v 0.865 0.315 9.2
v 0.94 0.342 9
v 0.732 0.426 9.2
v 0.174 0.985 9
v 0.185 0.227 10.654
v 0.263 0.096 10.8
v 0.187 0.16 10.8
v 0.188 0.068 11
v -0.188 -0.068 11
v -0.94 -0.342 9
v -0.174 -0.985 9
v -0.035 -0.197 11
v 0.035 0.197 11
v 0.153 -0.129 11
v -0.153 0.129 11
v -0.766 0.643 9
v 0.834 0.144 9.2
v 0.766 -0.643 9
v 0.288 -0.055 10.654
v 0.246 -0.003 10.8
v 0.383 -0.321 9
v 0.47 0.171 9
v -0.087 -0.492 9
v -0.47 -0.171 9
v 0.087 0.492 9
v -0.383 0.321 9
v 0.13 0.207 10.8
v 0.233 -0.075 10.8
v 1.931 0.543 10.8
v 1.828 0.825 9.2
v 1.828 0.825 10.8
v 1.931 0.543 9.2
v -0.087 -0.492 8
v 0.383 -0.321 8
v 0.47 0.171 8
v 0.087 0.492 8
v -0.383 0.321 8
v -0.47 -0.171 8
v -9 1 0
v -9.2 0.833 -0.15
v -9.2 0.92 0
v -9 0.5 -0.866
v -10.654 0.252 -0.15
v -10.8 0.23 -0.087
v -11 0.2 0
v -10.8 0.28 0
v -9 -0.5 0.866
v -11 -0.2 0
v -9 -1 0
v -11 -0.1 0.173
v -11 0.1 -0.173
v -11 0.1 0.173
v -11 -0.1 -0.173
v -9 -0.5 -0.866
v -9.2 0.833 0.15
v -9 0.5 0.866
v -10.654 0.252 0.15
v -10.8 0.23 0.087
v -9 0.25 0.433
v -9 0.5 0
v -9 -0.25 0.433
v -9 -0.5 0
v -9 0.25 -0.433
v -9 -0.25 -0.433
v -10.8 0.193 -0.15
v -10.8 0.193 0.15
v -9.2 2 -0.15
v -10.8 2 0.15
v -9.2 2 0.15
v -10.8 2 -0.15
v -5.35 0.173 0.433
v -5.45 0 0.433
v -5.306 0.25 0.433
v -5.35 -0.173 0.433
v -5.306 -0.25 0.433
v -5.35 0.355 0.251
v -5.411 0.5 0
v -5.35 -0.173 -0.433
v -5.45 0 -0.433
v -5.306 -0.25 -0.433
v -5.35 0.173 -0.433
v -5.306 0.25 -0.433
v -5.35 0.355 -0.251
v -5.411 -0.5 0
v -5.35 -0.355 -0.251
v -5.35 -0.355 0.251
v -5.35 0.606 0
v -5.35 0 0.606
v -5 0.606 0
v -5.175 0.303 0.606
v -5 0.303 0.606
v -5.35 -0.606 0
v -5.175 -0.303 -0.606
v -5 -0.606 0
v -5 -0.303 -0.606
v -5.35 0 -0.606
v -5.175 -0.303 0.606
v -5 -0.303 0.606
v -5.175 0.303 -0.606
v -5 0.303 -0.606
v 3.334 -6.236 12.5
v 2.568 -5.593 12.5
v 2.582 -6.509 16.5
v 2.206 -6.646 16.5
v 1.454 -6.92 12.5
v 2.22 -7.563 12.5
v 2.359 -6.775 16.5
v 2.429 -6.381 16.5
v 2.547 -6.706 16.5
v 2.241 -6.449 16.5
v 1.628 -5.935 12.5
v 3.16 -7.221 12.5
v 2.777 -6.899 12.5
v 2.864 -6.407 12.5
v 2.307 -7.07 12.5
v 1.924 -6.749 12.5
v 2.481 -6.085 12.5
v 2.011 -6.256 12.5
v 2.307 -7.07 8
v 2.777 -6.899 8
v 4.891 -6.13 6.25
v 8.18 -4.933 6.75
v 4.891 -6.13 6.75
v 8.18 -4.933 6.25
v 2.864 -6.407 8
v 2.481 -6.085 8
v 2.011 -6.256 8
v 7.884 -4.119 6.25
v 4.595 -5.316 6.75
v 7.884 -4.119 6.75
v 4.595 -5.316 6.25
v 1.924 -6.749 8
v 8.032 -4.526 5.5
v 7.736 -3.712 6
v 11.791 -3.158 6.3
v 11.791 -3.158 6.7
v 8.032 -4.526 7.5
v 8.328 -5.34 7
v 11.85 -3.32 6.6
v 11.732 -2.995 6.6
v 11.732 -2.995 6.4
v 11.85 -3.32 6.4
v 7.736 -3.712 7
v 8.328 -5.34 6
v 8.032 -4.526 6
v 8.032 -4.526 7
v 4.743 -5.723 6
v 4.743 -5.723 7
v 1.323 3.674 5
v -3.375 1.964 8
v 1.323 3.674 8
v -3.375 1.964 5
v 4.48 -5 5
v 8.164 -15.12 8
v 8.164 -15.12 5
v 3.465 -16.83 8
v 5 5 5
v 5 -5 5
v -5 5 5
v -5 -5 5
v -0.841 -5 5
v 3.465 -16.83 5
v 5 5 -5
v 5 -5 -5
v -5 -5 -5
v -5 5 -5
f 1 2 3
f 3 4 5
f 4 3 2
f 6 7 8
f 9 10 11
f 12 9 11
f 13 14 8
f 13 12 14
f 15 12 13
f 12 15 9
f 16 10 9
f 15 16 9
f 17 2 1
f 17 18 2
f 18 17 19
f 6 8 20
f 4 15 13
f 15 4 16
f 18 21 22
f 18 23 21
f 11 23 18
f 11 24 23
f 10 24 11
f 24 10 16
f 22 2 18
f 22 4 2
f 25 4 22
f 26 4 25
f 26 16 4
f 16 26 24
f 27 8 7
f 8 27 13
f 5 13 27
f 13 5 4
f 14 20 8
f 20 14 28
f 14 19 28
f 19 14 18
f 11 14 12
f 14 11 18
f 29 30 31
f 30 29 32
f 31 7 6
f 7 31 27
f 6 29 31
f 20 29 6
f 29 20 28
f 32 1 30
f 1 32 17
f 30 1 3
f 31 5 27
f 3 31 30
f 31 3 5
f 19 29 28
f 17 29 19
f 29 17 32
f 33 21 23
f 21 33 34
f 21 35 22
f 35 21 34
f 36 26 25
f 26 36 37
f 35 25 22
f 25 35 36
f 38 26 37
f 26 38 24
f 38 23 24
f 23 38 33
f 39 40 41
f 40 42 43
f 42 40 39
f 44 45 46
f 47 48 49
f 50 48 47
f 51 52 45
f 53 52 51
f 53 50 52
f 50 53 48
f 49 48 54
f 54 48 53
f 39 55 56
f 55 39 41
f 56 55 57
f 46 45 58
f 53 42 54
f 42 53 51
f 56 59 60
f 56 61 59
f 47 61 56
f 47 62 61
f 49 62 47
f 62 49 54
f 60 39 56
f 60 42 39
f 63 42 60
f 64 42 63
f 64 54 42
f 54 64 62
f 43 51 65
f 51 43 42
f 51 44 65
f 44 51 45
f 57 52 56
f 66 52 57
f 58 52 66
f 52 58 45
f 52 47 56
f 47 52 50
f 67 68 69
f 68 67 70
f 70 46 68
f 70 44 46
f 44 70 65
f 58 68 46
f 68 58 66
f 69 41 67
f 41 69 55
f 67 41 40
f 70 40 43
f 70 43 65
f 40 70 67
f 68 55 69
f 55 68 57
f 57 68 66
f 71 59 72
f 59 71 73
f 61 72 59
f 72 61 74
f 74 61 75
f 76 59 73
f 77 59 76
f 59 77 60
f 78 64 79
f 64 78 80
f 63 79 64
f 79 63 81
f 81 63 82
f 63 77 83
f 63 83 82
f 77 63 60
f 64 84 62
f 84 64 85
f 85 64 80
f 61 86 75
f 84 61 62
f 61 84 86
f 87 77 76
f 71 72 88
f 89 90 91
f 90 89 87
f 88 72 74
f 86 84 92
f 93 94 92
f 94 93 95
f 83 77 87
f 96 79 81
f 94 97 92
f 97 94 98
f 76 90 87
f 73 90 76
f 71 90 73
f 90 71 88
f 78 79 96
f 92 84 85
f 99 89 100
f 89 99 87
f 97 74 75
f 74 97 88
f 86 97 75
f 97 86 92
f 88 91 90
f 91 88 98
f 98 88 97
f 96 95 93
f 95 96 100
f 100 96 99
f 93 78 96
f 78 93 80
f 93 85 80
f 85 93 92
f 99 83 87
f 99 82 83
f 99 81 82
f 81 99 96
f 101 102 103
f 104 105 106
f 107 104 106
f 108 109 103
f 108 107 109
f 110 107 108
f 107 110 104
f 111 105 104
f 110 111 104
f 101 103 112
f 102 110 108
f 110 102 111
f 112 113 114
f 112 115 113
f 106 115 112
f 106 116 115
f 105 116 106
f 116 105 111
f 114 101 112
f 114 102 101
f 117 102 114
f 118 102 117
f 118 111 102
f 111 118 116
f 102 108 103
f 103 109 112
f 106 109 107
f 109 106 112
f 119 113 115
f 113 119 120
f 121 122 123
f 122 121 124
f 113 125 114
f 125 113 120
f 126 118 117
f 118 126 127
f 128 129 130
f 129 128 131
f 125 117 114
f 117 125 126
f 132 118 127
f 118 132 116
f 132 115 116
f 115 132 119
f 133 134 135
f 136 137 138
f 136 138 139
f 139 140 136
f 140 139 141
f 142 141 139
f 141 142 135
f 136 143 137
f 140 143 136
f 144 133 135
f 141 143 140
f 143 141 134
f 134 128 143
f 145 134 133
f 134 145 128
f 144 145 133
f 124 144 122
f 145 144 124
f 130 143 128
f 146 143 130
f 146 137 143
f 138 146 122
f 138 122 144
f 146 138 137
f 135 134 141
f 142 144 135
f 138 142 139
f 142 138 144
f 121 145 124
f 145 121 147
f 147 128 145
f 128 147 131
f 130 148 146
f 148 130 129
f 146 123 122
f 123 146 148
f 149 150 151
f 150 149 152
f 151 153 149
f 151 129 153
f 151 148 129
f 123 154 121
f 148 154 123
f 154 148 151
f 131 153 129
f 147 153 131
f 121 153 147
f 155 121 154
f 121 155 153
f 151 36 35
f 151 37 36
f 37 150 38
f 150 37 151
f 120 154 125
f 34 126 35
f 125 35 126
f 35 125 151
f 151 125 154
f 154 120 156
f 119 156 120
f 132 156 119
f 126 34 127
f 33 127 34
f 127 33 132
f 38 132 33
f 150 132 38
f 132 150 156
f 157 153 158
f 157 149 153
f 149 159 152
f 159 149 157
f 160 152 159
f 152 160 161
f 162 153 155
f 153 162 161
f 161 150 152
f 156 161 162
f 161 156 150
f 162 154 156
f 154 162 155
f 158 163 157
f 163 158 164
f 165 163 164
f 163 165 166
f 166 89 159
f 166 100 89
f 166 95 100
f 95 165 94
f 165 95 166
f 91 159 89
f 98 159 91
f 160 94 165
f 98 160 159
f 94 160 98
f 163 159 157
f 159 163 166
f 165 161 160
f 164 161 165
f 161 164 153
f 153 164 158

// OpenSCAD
//---------------------------------------------------------------
//-- Openscad Attachment library
//-- Attach parts easily. Make your designs more reusable and clean
//---------------------------------------------------------------
//-- This is a component of the obiscad opescad tools by Obijuan
//-- (C) Juan Gonzalez-Gomez (Obijuan)
//-- Sep-2012
//---------------------------------------------------------------
//-- Released under the GPL license
//---------------------------------------------------------------

use <vector.scad>

//--------------------------------------------------------------------
//-- Draw a connector
//-- A connector is defined a 3-tuple that consist of a point
//--- (the attachment point), and axis (the attachment axis) and
//--- an angle the connected part should be rotate around the 
//--  attachment axis
//--
//--- Input parameters:
//--
//--  Connector c = [p , n, ang] where:
//--
//--     p : The attachment point
//--     v : The attachment axis
//--   ang : the angle
//--------------------------------------------------------------------
module connector(c)
{
  //-- Get the three components from the connector
  p = c[0];
  v = c[1];
  ang = c[2];

  //-- Draw the attachment poing
  color("Gray") point(p);

  //-- Draw the attachment axis vector (with a mark)
  translate(p)
    rotate(a=ang, v=v)
    color("Gray") vector(unitv(v)*6, l_arrow=2, mark=true);
}


//-------------------------------------------------------------------------
//--  ATTACH OPERATOR
//--  This operator applies the necesary transformations to the 
//--  child (attachable part) so that it is attached to the main part
//--  
//--  Parameters
//--    a -> Connector of the main part
//--    b -> Connector of the attachable part
//-------------------------------------------------------------------------
module attach(a,b)
{
  //-- Get the data from the connectors
  pos1 = a[0];  //-- Attachment point. Main part
  v    = a[1];  //-- Attachment axis. Main part
  roll = a[2];  //-- Rolling angle
  
  pos2 = b[0];  //-- Attachment point. Attachable part
  vref = b[1];  //-- Atachment axis. Attachable part
                //-- The rolling angle of the attachable part is not used

  //-------- Calculations for the "orientate operator"------
  //-- Calculate the rotation axis
  raxis = cross(vref,v);
    
  //-- Calculate the angle between the vectors
  ang = anglev(vref,v);
  //--------------------------------------------------------.-

  //-- Apply the transformations to the child ---------------------------

  //-- Place the attachable part on the main part attachment point
  translate(pos1)
    //-- Orientate operator. Apply the orientation so that
    //-- both attachment axis are paralell. Also apply the roll angle
    rotate(a=roll, v=v)  rotate(a=ang, v=raxis)
      //-- Attachable part to the origin
      translate(-pos2)
	children(0); 
}


//--------------------------------------------------------------------
//---   An example of the attach operator
//---  
//---  There are two parts: the main body and an arm
//---  They both are cubes (for simplicity)
//---
//--   In the main body there are 2 connectors defined, so that
//--  the arm can be attached to any of them (or both if you like)
//------------------------------------------------------------------

//-- In the debug mode the connectors and additional information
//-- are shown
debug=true;

//-- Define the Main part: A cube
//-- Two attachment points are defined: one on the top, another in the
//--- left side
size = [10,10,10];

//-- Connectors defined:

//--     Att. point       Att. Axis  Roll
c1 = [ [0,0,size[2]/2],  [0,0,1],     20];  //-- Connector on the top
c2 = [ [-size[0]/2,0,0], [-1,0,0],    90];  //-- Connector on the left


//-- Draw the main part along with the connectors (for debugging)
cube(size,center=true);

//-- In debug mode: Draw the main part connectors!
if (debug) {
  connector(c1);
  connector(c2);
}

//-- Define the Attachable part. It is another cube, with one connector
asize = [5,20,3];
a = [ [0,asize[1]/2-3,-asize[2]/2], [0,0,1], 0  ];


//-- Do the attach!
//-- Just change c1 by c2 to attach the part to the other 
//-- connector. Super-easy!! :-)
//-- Modify the c1 and c2 roll angle for rotating the attachable
//--  part to the desired orientation
attach(c1,a)
  //-- This is the attachable part! 
  union() {
    cube(asize,center=true);  //-- The part

    //-- In debug mode show additional info:
    if (debug) {
      frame(l=10);    //-- The part frame of reference.
      connector(a);   //-- Show the part connector
    }
  };

  
